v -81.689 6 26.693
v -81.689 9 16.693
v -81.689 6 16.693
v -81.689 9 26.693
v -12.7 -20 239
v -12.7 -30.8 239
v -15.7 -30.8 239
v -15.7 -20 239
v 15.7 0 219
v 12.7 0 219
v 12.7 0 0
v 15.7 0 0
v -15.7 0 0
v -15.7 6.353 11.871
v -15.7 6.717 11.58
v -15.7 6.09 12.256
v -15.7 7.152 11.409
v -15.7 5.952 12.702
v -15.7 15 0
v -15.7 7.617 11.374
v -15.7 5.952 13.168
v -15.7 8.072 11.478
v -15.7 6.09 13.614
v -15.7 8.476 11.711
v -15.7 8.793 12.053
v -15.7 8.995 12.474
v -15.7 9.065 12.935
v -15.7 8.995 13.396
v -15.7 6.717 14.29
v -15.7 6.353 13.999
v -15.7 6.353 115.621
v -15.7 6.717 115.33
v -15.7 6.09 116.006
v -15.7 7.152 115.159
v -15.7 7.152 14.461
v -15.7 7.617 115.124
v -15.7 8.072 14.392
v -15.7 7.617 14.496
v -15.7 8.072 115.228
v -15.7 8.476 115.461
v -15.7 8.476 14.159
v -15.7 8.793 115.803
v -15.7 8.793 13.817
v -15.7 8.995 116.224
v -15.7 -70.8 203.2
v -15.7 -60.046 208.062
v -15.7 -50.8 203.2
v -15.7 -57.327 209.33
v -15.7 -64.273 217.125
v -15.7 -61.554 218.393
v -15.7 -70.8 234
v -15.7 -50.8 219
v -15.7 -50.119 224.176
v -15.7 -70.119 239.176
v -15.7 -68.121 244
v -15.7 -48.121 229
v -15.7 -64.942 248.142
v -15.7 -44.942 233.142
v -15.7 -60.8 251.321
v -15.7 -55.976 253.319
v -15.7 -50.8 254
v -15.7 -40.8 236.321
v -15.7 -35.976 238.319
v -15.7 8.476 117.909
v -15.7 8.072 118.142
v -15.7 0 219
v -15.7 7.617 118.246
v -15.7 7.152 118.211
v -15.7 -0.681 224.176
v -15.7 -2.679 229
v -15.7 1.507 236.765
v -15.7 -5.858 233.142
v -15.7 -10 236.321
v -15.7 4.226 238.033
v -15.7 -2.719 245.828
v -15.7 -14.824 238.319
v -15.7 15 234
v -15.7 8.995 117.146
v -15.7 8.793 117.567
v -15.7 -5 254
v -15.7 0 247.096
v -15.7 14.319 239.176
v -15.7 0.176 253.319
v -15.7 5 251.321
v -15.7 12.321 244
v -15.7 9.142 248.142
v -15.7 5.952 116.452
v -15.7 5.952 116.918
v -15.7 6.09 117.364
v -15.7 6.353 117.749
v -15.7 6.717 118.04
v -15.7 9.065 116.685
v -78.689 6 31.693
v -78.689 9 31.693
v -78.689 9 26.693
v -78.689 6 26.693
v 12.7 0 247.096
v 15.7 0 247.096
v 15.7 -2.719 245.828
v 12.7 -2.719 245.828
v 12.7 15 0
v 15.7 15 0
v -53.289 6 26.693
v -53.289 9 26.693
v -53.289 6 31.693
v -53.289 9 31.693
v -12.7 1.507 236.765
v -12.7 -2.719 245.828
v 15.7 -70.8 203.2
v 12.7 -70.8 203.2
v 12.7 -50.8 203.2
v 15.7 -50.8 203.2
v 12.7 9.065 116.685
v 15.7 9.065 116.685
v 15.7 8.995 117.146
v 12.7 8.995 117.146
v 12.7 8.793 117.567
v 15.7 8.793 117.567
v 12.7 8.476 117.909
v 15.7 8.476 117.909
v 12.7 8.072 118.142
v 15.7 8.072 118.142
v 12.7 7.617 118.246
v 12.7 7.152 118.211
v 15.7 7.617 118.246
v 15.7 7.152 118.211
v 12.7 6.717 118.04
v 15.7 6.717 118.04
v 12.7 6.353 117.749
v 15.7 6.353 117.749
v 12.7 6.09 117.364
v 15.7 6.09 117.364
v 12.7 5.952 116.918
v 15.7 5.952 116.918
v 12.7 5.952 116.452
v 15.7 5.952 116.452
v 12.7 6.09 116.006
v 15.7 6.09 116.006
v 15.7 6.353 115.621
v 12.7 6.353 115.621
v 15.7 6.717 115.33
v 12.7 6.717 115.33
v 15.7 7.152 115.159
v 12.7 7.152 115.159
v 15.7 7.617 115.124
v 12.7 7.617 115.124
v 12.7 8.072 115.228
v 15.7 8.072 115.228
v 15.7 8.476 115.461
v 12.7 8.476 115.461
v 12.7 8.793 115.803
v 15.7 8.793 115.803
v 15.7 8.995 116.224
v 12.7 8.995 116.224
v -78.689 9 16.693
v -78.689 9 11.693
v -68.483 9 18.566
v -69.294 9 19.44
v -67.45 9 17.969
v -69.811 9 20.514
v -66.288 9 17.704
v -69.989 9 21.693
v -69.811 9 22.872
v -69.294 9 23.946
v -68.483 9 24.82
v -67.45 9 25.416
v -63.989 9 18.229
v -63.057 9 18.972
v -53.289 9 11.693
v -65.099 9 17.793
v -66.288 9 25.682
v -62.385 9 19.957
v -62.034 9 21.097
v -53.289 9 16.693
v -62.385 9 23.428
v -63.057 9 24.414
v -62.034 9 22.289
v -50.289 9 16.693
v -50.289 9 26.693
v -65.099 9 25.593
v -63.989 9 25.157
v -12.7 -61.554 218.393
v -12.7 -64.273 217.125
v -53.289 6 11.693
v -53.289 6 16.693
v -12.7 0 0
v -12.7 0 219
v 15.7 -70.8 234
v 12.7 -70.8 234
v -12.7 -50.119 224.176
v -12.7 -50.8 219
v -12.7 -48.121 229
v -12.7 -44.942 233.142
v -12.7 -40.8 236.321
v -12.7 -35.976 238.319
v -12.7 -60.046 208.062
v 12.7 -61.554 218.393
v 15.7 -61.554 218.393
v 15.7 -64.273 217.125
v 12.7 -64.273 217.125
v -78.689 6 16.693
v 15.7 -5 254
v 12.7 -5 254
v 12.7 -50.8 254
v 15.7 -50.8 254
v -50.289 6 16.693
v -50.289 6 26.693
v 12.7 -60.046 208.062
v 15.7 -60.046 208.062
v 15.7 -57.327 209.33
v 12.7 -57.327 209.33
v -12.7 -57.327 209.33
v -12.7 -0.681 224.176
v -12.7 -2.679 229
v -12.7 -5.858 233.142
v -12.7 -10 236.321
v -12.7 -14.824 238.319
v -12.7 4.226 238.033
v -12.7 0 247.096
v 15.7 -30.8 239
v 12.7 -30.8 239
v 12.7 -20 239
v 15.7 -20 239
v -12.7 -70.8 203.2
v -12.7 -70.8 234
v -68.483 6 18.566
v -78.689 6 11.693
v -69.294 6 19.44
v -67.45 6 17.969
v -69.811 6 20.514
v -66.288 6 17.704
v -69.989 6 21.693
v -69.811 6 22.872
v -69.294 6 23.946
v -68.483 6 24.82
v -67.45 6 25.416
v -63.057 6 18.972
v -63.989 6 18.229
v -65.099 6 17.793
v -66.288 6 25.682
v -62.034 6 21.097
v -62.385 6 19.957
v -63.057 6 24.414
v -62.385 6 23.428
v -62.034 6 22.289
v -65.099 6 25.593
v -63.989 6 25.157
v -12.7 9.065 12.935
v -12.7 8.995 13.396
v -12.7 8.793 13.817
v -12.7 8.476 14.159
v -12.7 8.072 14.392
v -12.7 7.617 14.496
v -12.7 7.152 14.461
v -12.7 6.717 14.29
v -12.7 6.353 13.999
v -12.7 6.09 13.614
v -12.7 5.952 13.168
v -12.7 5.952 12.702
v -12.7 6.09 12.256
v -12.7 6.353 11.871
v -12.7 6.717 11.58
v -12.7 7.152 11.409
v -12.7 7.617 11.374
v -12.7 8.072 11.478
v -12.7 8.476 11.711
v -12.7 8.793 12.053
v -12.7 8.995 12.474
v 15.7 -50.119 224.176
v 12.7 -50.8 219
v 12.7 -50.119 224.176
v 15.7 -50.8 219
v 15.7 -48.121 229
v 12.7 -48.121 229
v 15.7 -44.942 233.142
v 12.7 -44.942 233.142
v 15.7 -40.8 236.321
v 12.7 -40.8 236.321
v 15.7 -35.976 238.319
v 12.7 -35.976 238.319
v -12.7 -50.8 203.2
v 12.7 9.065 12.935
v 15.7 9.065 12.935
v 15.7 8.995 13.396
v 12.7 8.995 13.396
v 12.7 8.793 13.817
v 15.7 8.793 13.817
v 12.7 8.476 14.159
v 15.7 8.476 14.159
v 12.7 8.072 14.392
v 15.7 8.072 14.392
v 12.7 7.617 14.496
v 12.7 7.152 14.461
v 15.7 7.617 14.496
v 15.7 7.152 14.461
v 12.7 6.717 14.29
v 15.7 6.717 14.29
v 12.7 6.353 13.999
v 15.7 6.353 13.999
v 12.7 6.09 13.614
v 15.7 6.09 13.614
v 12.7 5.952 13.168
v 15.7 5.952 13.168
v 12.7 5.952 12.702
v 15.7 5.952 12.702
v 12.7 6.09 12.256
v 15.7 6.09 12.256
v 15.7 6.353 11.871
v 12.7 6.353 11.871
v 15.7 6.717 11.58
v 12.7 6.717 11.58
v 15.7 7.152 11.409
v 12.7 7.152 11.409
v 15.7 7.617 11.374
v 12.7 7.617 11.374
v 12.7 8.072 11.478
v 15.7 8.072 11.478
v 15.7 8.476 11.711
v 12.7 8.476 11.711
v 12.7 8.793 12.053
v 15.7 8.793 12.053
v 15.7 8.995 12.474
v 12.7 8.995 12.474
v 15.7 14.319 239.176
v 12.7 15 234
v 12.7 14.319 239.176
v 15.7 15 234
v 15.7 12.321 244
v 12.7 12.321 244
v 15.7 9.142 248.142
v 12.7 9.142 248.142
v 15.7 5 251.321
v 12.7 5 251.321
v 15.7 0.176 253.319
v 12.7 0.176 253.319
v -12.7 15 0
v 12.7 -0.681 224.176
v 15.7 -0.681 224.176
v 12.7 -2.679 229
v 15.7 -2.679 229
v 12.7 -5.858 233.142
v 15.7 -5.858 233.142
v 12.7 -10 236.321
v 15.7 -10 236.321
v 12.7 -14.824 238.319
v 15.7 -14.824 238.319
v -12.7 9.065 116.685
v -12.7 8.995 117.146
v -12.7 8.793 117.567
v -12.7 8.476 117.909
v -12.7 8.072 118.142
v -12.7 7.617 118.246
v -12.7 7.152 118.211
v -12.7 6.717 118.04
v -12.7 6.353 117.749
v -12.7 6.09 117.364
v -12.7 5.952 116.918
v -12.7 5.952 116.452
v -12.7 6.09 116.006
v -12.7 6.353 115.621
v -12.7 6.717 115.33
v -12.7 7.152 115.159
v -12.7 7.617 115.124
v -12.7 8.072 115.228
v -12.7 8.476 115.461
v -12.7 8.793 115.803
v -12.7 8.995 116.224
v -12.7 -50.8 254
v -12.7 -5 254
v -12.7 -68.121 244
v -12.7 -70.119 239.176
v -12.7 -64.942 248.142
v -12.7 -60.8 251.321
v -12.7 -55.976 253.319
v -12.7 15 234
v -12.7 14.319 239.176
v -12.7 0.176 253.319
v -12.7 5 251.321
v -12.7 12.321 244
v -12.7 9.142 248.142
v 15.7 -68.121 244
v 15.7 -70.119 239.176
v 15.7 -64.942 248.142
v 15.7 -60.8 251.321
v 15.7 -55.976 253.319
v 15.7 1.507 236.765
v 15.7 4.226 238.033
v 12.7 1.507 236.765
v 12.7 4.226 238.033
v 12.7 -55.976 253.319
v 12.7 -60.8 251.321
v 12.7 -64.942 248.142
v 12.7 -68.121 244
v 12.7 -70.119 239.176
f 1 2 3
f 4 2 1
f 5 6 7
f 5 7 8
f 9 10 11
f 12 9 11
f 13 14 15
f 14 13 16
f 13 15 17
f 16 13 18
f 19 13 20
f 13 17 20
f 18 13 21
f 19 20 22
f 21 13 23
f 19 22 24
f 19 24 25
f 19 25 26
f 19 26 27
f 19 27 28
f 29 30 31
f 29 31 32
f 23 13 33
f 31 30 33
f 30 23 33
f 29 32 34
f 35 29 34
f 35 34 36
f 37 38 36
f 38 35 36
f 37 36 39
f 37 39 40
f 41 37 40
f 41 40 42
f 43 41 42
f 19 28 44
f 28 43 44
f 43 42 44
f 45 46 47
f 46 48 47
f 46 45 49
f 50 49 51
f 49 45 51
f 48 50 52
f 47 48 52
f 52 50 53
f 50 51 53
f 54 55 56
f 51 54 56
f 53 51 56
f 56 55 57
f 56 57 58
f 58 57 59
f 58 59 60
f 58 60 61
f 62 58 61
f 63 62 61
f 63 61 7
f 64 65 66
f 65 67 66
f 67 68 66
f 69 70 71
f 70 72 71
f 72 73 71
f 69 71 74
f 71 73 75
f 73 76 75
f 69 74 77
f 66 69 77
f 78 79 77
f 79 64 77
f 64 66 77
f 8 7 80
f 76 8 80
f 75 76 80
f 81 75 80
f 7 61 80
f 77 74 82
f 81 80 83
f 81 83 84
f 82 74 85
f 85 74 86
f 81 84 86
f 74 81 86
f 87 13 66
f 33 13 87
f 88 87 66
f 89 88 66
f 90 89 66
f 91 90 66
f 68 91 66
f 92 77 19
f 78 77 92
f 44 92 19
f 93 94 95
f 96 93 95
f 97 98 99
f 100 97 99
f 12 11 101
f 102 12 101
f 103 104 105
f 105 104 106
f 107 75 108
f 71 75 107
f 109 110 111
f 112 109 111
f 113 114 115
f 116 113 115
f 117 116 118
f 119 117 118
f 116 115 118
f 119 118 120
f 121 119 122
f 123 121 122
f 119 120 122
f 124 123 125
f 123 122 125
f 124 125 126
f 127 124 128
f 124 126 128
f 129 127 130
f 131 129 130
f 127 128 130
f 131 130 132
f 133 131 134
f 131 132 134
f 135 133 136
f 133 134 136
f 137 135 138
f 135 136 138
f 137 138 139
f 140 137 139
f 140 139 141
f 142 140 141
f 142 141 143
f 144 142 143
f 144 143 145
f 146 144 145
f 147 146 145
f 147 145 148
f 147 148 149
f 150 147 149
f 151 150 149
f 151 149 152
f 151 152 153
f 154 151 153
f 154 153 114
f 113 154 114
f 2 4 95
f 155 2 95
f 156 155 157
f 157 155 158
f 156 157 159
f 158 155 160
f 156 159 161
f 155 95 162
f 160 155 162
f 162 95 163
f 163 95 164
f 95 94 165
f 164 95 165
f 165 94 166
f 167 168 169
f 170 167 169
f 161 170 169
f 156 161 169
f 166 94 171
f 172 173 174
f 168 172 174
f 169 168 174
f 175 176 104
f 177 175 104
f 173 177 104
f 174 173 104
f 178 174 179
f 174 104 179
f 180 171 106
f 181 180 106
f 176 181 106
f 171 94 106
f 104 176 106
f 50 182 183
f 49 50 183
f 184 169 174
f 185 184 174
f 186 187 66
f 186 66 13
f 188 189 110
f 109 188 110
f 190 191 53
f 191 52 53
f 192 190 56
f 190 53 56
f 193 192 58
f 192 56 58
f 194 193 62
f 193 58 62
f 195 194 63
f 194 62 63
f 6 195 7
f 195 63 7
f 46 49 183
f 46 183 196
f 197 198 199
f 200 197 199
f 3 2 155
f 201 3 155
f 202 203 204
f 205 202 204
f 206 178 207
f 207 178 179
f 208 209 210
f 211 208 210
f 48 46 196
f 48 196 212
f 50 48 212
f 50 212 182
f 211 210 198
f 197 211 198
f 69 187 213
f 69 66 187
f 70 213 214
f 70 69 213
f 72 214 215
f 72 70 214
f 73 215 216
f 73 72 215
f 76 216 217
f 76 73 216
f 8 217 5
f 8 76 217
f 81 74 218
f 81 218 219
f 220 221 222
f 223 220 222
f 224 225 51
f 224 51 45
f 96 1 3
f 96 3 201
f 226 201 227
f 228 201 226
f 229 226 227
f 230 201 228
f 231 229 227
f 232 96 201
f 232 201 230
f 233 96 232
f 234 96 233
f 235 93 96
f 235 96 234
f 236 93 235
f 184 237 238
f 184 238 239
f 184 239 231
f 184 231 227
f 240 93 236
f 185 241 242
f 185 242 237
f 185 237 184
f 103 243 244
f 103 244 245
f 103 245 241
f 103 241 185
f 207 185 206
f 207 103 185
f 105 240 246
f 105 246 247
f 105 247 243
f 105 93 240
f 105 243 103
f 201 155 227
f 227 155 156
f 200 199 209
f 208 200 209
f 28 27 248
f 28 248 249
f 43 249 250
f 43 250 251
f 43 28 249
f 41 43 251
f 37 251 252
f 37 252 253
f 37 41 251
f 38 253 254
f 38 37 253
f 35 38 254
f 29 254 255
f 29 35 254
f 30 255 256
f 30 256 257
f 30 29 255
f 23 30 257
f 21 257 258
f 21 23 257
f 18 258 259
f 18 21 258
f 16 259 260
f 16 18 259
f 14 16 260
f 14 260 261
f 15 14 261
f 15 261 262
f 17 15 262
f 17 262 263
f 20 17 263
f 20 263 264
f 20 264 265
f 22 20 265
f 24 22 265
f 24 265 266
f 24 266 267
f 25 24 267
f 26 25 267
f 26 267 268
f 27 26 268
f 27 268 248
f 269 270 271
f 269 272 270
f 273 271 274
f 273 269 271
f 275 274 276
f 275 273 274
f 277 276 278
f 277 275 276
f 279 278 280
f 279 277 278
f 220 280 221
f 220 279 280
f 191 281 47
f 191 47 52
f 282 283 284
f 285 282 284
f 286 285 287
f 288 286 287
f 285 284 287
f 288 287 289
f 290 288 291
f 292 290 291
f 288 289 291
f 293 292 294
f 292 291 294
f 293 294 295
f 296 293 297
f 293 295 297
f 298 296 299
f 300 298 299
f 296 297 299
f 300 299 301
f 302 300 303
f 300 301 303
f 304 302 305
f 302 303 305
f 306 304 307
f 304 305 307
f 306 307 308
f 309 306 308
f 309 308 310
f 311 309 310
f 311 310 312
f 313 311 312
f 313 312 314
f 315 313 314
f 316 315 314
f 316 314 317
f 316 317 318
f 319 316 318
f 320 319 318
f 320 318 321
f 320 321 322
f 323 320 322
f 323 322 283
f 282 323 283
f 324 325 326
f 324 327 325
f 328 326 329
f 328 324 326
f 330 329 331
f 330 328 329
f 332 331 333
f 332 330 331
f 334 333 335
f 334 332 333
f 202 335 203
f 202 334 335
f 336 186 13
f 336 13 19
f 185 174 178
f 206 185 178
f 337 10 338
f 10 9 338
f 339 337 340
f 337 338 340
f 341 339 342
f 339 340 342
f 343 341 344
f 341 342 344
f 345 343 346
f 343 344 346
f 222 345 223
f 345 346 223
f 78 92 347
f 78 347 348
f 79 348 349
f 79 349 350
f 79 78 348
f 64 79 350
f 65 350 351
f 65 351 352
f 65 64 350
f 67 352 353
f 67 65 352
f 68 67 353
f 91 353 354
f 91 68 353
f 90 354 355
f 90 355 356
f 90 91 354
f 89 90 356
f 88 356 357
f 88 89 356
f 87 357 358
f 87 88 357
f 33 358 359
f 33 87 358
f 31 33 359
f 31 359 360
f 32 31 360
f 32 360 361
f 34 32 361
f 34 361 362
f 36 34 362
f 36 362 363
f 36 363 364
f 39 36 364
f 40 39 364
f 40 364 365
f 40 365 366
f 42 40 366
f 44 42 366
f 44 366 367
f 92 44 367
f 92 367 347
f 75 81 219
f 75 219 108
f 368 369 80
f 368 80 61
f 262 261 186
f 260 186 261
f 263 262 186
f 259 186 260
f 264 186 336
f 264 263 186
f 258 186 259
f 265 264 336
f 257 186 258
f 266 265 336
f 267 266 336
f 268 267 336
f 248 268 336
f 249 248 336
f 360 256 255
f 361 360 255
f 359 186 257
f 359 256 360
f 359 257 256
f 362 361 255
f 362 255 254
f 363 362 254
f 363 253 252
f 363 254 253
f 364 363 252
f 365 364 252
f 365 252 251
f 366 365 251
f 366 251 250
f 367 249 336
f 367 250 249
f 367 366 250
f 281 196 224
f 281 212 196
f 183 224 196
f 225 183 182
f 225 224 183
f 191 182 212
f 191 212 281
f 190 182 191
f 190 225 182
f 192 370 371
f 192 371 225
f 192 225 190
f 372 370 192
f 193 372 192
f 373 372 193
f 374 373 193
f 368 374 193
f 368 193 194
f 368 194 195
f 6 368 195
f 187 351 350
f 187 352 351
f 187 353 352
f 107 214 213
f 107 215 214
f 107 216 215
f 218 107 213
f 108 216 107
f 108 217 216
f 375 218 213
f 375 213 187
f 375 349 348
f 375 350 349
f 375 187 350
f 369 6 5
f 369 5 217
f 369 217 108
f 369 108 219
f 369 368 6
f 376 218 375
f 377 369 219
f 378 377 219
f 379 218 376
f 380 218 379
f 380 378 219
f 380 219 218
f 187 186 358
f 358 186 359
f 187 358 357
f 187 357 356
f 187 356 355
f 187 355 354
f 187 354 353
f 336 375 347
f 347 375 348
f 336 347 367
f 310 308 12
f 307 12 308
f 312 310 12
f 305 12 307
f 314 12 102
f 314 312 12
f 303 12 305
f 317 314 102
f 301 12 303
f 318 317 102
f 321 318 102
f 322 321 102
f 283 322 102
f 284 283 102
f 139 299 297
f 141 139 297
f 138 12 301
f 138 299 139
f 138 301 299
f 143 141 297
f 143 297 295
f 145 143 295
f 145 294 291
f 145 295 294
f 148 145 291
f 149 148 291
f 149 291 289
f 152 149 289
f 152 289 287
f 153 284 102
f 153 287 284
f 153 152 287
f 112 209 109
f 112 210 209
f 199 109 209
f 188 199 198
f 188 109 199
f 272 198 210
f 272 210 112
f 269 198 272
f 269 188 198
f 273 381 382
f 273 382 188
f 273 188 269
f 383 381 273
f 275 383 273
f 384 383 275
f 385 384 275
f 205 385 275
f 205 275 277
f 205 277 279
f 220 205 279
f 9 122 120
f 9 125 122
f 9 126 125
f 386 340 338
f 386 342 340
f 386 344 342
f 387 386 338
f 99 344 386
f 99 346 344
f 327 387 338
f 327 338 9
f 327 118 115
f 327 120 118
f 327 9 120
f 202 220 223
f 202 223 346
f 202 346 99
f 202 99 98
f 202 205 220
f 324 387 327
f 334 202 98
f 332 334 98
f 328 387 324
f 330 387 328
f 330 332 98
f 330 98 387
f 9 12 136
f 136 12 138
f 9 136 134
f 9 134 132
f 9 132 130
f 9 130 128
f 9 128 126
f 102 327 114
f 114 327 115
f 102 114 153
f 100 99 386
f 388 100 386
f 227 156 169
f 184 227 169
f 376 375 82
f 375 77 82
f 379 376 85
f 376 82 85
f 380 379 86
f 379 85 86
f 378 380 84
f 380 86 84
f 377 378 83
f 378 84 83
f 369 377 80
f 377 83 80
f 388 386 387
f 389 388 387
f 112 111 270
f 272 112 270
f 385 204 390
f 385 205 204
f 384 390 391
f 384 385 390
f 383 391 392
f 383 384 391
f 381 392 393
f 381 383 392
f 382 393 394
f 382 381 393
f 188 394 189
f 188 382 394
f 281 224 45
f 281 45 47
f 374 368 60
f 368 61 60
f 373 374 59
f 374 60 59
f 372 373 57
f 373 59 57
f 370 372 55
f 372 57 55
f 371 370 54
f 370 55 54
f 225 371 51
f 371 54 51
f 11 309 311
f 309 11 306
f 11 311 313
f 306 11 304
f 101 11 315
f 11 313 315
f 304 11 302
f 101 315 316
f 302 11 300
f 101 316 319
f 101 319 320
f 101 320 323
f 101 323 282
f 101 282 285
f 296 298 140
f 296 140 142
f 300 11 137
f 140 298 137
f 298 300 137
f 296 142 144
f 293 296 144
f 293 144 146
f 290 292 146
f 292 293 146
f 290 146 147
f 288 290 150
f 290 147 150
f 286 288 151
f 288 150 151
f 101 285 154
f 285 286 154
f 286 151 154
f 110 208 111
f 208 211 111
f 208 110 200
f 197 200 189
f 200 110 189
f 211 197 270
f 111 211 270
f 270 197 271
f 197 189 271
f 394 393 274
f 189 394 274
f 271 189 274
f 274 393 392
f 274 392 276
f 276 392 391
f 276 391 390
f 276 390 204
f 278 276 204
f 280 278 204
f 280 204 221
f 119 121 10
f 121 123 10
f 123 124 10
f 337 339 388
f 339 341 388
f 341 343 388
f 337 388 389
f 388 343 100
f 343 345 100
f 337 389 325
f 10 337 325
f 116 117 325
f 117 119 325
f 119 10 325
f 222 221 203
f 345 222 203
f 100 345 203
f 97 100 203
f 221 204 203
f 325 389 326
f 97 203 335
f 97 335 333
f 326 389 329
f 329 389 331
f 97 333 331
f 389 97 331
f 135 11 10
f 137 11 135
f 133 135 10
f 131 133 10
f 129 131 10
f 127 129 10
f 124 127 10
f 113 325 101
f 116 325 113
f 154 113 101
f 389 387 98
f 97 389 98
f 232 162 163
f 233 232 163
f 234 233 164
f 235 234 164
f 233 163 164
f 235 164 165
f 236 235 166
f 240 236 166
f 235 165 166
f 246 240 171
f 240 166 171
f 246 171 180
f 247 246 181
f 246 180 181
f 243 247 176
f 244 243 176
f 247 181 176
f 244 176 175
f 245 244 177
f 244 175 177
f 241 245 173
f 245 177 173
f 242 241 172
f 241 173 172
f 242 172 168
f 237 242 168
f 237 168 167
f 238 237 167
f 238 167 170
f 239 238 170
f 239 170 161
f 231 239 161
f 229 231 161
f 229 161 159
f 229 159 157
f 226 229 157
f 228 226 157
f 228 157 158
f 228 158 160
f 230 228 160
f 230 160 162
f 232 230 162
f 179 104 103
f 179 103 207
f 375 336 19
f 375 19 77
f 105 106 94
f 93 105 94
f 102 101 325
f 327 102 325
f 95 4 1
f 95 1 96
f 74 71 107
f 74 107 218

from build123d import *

# Parameters (mm, degrees)
F2_DEPTH  = 3
F3_R      = 20
F4_R      = 1.565
F5_DEPTH  = 25
F7_DEPTH  = 25
F10_W     = 3
F10_H     = 10
F11_DEPTH = 3
F12_R     = 4
F13_DEPTH = 25


with BuildPart() as f2:
    # F1 (on offset) → F2 (new body)
    with BuildSketch(Plane.YZ.offset(12.7)):
        Polygon((0, 239), (0, 0), (15, 0), (15, 254), (-70.8, 254), (-70.8, 203.2), (-50.8, 203.2), (-50.8, 239), align=None)
    extrude(amount=F2_DEPTH)

    # F3
    f3_edges = [f2.edges().sort_by_distance(p)[0] for p in [
        (14.2, -70.8, 254),
        (14.2, 15, 254),
        (14.2, -50.8, 239),
        (14.2, 0, 239),
    ]]
    fillet(f3_edges, radius=F3_R)

    # F4 (on face) → F5 (cut)
    with BuildSketch(Plane.YZ.offset(15.7)):
        with Locations((7.5, 12.935)):
            Circle(F4_R)
        with Locations((7.5, 116.685)):
            Circle(F4_R)
    extrude(amount=-F5_DEPTH, mode=Mode.SUBTRACT)

    # F6 (on face) → F7 (cut)
    with BuildSketch(Plane.YZ.offset(15.7)):
        Polygon((0, 247.095909), (-2.718923, 245.828054), (1.507259, 236.764976), (4.226183, 238.032831), align=None)
        Polygon((-61.55363, 218.39298), (-64.272553, 217.125125), (-60.04637, 208.062048), (-57.327447, 209.329902), align=None)
    extrude(amount=-F7_DEPTH, mode=Mode.SUBTRACT)


with BuildPart() as f8_1:
    # F8: instance of F2
    add(f2.part.mirror(Plane.YZ))


with BuildPart() as f11:
    # F10 (on offset) → F11 (new body)
    with BuildSketch(Plane.XZ.offset(-9)):
        Polygon((-53.288891, 26.69288), (-53.288891, 31.69288), (-78.688891, 31.69288), (-78.688891, 26.69288), (-78.688891, 16.69288), (-78.688891, 11.69288), (-53.288891, 11.69288), (-53.288891, 16.69288), align=None)
        with Locations((-51.788891, 21.69288)):
            Rectangle(F10_W, F10_H)
        with Locations((-80.188891, 21.69288)):
            Rectangle(F10_W, F10_H)
    extrude(amount=F11_DEPTH)

    # F12 (on face) → F13 (cut)
    with BuildSketch(Plane(origin=(0, 9, 0), x_dir=(-1, 0, 0), z_dir=(0, 1, 0))):
        with Locations((65.988891, 21.69288)):
            Circle(F12_R)
    extrude(amount=-F13_DEPTH, mode=Mode.SUBTRACT)


solid = Compound([f2.part, f8_1.part, f11.part])
